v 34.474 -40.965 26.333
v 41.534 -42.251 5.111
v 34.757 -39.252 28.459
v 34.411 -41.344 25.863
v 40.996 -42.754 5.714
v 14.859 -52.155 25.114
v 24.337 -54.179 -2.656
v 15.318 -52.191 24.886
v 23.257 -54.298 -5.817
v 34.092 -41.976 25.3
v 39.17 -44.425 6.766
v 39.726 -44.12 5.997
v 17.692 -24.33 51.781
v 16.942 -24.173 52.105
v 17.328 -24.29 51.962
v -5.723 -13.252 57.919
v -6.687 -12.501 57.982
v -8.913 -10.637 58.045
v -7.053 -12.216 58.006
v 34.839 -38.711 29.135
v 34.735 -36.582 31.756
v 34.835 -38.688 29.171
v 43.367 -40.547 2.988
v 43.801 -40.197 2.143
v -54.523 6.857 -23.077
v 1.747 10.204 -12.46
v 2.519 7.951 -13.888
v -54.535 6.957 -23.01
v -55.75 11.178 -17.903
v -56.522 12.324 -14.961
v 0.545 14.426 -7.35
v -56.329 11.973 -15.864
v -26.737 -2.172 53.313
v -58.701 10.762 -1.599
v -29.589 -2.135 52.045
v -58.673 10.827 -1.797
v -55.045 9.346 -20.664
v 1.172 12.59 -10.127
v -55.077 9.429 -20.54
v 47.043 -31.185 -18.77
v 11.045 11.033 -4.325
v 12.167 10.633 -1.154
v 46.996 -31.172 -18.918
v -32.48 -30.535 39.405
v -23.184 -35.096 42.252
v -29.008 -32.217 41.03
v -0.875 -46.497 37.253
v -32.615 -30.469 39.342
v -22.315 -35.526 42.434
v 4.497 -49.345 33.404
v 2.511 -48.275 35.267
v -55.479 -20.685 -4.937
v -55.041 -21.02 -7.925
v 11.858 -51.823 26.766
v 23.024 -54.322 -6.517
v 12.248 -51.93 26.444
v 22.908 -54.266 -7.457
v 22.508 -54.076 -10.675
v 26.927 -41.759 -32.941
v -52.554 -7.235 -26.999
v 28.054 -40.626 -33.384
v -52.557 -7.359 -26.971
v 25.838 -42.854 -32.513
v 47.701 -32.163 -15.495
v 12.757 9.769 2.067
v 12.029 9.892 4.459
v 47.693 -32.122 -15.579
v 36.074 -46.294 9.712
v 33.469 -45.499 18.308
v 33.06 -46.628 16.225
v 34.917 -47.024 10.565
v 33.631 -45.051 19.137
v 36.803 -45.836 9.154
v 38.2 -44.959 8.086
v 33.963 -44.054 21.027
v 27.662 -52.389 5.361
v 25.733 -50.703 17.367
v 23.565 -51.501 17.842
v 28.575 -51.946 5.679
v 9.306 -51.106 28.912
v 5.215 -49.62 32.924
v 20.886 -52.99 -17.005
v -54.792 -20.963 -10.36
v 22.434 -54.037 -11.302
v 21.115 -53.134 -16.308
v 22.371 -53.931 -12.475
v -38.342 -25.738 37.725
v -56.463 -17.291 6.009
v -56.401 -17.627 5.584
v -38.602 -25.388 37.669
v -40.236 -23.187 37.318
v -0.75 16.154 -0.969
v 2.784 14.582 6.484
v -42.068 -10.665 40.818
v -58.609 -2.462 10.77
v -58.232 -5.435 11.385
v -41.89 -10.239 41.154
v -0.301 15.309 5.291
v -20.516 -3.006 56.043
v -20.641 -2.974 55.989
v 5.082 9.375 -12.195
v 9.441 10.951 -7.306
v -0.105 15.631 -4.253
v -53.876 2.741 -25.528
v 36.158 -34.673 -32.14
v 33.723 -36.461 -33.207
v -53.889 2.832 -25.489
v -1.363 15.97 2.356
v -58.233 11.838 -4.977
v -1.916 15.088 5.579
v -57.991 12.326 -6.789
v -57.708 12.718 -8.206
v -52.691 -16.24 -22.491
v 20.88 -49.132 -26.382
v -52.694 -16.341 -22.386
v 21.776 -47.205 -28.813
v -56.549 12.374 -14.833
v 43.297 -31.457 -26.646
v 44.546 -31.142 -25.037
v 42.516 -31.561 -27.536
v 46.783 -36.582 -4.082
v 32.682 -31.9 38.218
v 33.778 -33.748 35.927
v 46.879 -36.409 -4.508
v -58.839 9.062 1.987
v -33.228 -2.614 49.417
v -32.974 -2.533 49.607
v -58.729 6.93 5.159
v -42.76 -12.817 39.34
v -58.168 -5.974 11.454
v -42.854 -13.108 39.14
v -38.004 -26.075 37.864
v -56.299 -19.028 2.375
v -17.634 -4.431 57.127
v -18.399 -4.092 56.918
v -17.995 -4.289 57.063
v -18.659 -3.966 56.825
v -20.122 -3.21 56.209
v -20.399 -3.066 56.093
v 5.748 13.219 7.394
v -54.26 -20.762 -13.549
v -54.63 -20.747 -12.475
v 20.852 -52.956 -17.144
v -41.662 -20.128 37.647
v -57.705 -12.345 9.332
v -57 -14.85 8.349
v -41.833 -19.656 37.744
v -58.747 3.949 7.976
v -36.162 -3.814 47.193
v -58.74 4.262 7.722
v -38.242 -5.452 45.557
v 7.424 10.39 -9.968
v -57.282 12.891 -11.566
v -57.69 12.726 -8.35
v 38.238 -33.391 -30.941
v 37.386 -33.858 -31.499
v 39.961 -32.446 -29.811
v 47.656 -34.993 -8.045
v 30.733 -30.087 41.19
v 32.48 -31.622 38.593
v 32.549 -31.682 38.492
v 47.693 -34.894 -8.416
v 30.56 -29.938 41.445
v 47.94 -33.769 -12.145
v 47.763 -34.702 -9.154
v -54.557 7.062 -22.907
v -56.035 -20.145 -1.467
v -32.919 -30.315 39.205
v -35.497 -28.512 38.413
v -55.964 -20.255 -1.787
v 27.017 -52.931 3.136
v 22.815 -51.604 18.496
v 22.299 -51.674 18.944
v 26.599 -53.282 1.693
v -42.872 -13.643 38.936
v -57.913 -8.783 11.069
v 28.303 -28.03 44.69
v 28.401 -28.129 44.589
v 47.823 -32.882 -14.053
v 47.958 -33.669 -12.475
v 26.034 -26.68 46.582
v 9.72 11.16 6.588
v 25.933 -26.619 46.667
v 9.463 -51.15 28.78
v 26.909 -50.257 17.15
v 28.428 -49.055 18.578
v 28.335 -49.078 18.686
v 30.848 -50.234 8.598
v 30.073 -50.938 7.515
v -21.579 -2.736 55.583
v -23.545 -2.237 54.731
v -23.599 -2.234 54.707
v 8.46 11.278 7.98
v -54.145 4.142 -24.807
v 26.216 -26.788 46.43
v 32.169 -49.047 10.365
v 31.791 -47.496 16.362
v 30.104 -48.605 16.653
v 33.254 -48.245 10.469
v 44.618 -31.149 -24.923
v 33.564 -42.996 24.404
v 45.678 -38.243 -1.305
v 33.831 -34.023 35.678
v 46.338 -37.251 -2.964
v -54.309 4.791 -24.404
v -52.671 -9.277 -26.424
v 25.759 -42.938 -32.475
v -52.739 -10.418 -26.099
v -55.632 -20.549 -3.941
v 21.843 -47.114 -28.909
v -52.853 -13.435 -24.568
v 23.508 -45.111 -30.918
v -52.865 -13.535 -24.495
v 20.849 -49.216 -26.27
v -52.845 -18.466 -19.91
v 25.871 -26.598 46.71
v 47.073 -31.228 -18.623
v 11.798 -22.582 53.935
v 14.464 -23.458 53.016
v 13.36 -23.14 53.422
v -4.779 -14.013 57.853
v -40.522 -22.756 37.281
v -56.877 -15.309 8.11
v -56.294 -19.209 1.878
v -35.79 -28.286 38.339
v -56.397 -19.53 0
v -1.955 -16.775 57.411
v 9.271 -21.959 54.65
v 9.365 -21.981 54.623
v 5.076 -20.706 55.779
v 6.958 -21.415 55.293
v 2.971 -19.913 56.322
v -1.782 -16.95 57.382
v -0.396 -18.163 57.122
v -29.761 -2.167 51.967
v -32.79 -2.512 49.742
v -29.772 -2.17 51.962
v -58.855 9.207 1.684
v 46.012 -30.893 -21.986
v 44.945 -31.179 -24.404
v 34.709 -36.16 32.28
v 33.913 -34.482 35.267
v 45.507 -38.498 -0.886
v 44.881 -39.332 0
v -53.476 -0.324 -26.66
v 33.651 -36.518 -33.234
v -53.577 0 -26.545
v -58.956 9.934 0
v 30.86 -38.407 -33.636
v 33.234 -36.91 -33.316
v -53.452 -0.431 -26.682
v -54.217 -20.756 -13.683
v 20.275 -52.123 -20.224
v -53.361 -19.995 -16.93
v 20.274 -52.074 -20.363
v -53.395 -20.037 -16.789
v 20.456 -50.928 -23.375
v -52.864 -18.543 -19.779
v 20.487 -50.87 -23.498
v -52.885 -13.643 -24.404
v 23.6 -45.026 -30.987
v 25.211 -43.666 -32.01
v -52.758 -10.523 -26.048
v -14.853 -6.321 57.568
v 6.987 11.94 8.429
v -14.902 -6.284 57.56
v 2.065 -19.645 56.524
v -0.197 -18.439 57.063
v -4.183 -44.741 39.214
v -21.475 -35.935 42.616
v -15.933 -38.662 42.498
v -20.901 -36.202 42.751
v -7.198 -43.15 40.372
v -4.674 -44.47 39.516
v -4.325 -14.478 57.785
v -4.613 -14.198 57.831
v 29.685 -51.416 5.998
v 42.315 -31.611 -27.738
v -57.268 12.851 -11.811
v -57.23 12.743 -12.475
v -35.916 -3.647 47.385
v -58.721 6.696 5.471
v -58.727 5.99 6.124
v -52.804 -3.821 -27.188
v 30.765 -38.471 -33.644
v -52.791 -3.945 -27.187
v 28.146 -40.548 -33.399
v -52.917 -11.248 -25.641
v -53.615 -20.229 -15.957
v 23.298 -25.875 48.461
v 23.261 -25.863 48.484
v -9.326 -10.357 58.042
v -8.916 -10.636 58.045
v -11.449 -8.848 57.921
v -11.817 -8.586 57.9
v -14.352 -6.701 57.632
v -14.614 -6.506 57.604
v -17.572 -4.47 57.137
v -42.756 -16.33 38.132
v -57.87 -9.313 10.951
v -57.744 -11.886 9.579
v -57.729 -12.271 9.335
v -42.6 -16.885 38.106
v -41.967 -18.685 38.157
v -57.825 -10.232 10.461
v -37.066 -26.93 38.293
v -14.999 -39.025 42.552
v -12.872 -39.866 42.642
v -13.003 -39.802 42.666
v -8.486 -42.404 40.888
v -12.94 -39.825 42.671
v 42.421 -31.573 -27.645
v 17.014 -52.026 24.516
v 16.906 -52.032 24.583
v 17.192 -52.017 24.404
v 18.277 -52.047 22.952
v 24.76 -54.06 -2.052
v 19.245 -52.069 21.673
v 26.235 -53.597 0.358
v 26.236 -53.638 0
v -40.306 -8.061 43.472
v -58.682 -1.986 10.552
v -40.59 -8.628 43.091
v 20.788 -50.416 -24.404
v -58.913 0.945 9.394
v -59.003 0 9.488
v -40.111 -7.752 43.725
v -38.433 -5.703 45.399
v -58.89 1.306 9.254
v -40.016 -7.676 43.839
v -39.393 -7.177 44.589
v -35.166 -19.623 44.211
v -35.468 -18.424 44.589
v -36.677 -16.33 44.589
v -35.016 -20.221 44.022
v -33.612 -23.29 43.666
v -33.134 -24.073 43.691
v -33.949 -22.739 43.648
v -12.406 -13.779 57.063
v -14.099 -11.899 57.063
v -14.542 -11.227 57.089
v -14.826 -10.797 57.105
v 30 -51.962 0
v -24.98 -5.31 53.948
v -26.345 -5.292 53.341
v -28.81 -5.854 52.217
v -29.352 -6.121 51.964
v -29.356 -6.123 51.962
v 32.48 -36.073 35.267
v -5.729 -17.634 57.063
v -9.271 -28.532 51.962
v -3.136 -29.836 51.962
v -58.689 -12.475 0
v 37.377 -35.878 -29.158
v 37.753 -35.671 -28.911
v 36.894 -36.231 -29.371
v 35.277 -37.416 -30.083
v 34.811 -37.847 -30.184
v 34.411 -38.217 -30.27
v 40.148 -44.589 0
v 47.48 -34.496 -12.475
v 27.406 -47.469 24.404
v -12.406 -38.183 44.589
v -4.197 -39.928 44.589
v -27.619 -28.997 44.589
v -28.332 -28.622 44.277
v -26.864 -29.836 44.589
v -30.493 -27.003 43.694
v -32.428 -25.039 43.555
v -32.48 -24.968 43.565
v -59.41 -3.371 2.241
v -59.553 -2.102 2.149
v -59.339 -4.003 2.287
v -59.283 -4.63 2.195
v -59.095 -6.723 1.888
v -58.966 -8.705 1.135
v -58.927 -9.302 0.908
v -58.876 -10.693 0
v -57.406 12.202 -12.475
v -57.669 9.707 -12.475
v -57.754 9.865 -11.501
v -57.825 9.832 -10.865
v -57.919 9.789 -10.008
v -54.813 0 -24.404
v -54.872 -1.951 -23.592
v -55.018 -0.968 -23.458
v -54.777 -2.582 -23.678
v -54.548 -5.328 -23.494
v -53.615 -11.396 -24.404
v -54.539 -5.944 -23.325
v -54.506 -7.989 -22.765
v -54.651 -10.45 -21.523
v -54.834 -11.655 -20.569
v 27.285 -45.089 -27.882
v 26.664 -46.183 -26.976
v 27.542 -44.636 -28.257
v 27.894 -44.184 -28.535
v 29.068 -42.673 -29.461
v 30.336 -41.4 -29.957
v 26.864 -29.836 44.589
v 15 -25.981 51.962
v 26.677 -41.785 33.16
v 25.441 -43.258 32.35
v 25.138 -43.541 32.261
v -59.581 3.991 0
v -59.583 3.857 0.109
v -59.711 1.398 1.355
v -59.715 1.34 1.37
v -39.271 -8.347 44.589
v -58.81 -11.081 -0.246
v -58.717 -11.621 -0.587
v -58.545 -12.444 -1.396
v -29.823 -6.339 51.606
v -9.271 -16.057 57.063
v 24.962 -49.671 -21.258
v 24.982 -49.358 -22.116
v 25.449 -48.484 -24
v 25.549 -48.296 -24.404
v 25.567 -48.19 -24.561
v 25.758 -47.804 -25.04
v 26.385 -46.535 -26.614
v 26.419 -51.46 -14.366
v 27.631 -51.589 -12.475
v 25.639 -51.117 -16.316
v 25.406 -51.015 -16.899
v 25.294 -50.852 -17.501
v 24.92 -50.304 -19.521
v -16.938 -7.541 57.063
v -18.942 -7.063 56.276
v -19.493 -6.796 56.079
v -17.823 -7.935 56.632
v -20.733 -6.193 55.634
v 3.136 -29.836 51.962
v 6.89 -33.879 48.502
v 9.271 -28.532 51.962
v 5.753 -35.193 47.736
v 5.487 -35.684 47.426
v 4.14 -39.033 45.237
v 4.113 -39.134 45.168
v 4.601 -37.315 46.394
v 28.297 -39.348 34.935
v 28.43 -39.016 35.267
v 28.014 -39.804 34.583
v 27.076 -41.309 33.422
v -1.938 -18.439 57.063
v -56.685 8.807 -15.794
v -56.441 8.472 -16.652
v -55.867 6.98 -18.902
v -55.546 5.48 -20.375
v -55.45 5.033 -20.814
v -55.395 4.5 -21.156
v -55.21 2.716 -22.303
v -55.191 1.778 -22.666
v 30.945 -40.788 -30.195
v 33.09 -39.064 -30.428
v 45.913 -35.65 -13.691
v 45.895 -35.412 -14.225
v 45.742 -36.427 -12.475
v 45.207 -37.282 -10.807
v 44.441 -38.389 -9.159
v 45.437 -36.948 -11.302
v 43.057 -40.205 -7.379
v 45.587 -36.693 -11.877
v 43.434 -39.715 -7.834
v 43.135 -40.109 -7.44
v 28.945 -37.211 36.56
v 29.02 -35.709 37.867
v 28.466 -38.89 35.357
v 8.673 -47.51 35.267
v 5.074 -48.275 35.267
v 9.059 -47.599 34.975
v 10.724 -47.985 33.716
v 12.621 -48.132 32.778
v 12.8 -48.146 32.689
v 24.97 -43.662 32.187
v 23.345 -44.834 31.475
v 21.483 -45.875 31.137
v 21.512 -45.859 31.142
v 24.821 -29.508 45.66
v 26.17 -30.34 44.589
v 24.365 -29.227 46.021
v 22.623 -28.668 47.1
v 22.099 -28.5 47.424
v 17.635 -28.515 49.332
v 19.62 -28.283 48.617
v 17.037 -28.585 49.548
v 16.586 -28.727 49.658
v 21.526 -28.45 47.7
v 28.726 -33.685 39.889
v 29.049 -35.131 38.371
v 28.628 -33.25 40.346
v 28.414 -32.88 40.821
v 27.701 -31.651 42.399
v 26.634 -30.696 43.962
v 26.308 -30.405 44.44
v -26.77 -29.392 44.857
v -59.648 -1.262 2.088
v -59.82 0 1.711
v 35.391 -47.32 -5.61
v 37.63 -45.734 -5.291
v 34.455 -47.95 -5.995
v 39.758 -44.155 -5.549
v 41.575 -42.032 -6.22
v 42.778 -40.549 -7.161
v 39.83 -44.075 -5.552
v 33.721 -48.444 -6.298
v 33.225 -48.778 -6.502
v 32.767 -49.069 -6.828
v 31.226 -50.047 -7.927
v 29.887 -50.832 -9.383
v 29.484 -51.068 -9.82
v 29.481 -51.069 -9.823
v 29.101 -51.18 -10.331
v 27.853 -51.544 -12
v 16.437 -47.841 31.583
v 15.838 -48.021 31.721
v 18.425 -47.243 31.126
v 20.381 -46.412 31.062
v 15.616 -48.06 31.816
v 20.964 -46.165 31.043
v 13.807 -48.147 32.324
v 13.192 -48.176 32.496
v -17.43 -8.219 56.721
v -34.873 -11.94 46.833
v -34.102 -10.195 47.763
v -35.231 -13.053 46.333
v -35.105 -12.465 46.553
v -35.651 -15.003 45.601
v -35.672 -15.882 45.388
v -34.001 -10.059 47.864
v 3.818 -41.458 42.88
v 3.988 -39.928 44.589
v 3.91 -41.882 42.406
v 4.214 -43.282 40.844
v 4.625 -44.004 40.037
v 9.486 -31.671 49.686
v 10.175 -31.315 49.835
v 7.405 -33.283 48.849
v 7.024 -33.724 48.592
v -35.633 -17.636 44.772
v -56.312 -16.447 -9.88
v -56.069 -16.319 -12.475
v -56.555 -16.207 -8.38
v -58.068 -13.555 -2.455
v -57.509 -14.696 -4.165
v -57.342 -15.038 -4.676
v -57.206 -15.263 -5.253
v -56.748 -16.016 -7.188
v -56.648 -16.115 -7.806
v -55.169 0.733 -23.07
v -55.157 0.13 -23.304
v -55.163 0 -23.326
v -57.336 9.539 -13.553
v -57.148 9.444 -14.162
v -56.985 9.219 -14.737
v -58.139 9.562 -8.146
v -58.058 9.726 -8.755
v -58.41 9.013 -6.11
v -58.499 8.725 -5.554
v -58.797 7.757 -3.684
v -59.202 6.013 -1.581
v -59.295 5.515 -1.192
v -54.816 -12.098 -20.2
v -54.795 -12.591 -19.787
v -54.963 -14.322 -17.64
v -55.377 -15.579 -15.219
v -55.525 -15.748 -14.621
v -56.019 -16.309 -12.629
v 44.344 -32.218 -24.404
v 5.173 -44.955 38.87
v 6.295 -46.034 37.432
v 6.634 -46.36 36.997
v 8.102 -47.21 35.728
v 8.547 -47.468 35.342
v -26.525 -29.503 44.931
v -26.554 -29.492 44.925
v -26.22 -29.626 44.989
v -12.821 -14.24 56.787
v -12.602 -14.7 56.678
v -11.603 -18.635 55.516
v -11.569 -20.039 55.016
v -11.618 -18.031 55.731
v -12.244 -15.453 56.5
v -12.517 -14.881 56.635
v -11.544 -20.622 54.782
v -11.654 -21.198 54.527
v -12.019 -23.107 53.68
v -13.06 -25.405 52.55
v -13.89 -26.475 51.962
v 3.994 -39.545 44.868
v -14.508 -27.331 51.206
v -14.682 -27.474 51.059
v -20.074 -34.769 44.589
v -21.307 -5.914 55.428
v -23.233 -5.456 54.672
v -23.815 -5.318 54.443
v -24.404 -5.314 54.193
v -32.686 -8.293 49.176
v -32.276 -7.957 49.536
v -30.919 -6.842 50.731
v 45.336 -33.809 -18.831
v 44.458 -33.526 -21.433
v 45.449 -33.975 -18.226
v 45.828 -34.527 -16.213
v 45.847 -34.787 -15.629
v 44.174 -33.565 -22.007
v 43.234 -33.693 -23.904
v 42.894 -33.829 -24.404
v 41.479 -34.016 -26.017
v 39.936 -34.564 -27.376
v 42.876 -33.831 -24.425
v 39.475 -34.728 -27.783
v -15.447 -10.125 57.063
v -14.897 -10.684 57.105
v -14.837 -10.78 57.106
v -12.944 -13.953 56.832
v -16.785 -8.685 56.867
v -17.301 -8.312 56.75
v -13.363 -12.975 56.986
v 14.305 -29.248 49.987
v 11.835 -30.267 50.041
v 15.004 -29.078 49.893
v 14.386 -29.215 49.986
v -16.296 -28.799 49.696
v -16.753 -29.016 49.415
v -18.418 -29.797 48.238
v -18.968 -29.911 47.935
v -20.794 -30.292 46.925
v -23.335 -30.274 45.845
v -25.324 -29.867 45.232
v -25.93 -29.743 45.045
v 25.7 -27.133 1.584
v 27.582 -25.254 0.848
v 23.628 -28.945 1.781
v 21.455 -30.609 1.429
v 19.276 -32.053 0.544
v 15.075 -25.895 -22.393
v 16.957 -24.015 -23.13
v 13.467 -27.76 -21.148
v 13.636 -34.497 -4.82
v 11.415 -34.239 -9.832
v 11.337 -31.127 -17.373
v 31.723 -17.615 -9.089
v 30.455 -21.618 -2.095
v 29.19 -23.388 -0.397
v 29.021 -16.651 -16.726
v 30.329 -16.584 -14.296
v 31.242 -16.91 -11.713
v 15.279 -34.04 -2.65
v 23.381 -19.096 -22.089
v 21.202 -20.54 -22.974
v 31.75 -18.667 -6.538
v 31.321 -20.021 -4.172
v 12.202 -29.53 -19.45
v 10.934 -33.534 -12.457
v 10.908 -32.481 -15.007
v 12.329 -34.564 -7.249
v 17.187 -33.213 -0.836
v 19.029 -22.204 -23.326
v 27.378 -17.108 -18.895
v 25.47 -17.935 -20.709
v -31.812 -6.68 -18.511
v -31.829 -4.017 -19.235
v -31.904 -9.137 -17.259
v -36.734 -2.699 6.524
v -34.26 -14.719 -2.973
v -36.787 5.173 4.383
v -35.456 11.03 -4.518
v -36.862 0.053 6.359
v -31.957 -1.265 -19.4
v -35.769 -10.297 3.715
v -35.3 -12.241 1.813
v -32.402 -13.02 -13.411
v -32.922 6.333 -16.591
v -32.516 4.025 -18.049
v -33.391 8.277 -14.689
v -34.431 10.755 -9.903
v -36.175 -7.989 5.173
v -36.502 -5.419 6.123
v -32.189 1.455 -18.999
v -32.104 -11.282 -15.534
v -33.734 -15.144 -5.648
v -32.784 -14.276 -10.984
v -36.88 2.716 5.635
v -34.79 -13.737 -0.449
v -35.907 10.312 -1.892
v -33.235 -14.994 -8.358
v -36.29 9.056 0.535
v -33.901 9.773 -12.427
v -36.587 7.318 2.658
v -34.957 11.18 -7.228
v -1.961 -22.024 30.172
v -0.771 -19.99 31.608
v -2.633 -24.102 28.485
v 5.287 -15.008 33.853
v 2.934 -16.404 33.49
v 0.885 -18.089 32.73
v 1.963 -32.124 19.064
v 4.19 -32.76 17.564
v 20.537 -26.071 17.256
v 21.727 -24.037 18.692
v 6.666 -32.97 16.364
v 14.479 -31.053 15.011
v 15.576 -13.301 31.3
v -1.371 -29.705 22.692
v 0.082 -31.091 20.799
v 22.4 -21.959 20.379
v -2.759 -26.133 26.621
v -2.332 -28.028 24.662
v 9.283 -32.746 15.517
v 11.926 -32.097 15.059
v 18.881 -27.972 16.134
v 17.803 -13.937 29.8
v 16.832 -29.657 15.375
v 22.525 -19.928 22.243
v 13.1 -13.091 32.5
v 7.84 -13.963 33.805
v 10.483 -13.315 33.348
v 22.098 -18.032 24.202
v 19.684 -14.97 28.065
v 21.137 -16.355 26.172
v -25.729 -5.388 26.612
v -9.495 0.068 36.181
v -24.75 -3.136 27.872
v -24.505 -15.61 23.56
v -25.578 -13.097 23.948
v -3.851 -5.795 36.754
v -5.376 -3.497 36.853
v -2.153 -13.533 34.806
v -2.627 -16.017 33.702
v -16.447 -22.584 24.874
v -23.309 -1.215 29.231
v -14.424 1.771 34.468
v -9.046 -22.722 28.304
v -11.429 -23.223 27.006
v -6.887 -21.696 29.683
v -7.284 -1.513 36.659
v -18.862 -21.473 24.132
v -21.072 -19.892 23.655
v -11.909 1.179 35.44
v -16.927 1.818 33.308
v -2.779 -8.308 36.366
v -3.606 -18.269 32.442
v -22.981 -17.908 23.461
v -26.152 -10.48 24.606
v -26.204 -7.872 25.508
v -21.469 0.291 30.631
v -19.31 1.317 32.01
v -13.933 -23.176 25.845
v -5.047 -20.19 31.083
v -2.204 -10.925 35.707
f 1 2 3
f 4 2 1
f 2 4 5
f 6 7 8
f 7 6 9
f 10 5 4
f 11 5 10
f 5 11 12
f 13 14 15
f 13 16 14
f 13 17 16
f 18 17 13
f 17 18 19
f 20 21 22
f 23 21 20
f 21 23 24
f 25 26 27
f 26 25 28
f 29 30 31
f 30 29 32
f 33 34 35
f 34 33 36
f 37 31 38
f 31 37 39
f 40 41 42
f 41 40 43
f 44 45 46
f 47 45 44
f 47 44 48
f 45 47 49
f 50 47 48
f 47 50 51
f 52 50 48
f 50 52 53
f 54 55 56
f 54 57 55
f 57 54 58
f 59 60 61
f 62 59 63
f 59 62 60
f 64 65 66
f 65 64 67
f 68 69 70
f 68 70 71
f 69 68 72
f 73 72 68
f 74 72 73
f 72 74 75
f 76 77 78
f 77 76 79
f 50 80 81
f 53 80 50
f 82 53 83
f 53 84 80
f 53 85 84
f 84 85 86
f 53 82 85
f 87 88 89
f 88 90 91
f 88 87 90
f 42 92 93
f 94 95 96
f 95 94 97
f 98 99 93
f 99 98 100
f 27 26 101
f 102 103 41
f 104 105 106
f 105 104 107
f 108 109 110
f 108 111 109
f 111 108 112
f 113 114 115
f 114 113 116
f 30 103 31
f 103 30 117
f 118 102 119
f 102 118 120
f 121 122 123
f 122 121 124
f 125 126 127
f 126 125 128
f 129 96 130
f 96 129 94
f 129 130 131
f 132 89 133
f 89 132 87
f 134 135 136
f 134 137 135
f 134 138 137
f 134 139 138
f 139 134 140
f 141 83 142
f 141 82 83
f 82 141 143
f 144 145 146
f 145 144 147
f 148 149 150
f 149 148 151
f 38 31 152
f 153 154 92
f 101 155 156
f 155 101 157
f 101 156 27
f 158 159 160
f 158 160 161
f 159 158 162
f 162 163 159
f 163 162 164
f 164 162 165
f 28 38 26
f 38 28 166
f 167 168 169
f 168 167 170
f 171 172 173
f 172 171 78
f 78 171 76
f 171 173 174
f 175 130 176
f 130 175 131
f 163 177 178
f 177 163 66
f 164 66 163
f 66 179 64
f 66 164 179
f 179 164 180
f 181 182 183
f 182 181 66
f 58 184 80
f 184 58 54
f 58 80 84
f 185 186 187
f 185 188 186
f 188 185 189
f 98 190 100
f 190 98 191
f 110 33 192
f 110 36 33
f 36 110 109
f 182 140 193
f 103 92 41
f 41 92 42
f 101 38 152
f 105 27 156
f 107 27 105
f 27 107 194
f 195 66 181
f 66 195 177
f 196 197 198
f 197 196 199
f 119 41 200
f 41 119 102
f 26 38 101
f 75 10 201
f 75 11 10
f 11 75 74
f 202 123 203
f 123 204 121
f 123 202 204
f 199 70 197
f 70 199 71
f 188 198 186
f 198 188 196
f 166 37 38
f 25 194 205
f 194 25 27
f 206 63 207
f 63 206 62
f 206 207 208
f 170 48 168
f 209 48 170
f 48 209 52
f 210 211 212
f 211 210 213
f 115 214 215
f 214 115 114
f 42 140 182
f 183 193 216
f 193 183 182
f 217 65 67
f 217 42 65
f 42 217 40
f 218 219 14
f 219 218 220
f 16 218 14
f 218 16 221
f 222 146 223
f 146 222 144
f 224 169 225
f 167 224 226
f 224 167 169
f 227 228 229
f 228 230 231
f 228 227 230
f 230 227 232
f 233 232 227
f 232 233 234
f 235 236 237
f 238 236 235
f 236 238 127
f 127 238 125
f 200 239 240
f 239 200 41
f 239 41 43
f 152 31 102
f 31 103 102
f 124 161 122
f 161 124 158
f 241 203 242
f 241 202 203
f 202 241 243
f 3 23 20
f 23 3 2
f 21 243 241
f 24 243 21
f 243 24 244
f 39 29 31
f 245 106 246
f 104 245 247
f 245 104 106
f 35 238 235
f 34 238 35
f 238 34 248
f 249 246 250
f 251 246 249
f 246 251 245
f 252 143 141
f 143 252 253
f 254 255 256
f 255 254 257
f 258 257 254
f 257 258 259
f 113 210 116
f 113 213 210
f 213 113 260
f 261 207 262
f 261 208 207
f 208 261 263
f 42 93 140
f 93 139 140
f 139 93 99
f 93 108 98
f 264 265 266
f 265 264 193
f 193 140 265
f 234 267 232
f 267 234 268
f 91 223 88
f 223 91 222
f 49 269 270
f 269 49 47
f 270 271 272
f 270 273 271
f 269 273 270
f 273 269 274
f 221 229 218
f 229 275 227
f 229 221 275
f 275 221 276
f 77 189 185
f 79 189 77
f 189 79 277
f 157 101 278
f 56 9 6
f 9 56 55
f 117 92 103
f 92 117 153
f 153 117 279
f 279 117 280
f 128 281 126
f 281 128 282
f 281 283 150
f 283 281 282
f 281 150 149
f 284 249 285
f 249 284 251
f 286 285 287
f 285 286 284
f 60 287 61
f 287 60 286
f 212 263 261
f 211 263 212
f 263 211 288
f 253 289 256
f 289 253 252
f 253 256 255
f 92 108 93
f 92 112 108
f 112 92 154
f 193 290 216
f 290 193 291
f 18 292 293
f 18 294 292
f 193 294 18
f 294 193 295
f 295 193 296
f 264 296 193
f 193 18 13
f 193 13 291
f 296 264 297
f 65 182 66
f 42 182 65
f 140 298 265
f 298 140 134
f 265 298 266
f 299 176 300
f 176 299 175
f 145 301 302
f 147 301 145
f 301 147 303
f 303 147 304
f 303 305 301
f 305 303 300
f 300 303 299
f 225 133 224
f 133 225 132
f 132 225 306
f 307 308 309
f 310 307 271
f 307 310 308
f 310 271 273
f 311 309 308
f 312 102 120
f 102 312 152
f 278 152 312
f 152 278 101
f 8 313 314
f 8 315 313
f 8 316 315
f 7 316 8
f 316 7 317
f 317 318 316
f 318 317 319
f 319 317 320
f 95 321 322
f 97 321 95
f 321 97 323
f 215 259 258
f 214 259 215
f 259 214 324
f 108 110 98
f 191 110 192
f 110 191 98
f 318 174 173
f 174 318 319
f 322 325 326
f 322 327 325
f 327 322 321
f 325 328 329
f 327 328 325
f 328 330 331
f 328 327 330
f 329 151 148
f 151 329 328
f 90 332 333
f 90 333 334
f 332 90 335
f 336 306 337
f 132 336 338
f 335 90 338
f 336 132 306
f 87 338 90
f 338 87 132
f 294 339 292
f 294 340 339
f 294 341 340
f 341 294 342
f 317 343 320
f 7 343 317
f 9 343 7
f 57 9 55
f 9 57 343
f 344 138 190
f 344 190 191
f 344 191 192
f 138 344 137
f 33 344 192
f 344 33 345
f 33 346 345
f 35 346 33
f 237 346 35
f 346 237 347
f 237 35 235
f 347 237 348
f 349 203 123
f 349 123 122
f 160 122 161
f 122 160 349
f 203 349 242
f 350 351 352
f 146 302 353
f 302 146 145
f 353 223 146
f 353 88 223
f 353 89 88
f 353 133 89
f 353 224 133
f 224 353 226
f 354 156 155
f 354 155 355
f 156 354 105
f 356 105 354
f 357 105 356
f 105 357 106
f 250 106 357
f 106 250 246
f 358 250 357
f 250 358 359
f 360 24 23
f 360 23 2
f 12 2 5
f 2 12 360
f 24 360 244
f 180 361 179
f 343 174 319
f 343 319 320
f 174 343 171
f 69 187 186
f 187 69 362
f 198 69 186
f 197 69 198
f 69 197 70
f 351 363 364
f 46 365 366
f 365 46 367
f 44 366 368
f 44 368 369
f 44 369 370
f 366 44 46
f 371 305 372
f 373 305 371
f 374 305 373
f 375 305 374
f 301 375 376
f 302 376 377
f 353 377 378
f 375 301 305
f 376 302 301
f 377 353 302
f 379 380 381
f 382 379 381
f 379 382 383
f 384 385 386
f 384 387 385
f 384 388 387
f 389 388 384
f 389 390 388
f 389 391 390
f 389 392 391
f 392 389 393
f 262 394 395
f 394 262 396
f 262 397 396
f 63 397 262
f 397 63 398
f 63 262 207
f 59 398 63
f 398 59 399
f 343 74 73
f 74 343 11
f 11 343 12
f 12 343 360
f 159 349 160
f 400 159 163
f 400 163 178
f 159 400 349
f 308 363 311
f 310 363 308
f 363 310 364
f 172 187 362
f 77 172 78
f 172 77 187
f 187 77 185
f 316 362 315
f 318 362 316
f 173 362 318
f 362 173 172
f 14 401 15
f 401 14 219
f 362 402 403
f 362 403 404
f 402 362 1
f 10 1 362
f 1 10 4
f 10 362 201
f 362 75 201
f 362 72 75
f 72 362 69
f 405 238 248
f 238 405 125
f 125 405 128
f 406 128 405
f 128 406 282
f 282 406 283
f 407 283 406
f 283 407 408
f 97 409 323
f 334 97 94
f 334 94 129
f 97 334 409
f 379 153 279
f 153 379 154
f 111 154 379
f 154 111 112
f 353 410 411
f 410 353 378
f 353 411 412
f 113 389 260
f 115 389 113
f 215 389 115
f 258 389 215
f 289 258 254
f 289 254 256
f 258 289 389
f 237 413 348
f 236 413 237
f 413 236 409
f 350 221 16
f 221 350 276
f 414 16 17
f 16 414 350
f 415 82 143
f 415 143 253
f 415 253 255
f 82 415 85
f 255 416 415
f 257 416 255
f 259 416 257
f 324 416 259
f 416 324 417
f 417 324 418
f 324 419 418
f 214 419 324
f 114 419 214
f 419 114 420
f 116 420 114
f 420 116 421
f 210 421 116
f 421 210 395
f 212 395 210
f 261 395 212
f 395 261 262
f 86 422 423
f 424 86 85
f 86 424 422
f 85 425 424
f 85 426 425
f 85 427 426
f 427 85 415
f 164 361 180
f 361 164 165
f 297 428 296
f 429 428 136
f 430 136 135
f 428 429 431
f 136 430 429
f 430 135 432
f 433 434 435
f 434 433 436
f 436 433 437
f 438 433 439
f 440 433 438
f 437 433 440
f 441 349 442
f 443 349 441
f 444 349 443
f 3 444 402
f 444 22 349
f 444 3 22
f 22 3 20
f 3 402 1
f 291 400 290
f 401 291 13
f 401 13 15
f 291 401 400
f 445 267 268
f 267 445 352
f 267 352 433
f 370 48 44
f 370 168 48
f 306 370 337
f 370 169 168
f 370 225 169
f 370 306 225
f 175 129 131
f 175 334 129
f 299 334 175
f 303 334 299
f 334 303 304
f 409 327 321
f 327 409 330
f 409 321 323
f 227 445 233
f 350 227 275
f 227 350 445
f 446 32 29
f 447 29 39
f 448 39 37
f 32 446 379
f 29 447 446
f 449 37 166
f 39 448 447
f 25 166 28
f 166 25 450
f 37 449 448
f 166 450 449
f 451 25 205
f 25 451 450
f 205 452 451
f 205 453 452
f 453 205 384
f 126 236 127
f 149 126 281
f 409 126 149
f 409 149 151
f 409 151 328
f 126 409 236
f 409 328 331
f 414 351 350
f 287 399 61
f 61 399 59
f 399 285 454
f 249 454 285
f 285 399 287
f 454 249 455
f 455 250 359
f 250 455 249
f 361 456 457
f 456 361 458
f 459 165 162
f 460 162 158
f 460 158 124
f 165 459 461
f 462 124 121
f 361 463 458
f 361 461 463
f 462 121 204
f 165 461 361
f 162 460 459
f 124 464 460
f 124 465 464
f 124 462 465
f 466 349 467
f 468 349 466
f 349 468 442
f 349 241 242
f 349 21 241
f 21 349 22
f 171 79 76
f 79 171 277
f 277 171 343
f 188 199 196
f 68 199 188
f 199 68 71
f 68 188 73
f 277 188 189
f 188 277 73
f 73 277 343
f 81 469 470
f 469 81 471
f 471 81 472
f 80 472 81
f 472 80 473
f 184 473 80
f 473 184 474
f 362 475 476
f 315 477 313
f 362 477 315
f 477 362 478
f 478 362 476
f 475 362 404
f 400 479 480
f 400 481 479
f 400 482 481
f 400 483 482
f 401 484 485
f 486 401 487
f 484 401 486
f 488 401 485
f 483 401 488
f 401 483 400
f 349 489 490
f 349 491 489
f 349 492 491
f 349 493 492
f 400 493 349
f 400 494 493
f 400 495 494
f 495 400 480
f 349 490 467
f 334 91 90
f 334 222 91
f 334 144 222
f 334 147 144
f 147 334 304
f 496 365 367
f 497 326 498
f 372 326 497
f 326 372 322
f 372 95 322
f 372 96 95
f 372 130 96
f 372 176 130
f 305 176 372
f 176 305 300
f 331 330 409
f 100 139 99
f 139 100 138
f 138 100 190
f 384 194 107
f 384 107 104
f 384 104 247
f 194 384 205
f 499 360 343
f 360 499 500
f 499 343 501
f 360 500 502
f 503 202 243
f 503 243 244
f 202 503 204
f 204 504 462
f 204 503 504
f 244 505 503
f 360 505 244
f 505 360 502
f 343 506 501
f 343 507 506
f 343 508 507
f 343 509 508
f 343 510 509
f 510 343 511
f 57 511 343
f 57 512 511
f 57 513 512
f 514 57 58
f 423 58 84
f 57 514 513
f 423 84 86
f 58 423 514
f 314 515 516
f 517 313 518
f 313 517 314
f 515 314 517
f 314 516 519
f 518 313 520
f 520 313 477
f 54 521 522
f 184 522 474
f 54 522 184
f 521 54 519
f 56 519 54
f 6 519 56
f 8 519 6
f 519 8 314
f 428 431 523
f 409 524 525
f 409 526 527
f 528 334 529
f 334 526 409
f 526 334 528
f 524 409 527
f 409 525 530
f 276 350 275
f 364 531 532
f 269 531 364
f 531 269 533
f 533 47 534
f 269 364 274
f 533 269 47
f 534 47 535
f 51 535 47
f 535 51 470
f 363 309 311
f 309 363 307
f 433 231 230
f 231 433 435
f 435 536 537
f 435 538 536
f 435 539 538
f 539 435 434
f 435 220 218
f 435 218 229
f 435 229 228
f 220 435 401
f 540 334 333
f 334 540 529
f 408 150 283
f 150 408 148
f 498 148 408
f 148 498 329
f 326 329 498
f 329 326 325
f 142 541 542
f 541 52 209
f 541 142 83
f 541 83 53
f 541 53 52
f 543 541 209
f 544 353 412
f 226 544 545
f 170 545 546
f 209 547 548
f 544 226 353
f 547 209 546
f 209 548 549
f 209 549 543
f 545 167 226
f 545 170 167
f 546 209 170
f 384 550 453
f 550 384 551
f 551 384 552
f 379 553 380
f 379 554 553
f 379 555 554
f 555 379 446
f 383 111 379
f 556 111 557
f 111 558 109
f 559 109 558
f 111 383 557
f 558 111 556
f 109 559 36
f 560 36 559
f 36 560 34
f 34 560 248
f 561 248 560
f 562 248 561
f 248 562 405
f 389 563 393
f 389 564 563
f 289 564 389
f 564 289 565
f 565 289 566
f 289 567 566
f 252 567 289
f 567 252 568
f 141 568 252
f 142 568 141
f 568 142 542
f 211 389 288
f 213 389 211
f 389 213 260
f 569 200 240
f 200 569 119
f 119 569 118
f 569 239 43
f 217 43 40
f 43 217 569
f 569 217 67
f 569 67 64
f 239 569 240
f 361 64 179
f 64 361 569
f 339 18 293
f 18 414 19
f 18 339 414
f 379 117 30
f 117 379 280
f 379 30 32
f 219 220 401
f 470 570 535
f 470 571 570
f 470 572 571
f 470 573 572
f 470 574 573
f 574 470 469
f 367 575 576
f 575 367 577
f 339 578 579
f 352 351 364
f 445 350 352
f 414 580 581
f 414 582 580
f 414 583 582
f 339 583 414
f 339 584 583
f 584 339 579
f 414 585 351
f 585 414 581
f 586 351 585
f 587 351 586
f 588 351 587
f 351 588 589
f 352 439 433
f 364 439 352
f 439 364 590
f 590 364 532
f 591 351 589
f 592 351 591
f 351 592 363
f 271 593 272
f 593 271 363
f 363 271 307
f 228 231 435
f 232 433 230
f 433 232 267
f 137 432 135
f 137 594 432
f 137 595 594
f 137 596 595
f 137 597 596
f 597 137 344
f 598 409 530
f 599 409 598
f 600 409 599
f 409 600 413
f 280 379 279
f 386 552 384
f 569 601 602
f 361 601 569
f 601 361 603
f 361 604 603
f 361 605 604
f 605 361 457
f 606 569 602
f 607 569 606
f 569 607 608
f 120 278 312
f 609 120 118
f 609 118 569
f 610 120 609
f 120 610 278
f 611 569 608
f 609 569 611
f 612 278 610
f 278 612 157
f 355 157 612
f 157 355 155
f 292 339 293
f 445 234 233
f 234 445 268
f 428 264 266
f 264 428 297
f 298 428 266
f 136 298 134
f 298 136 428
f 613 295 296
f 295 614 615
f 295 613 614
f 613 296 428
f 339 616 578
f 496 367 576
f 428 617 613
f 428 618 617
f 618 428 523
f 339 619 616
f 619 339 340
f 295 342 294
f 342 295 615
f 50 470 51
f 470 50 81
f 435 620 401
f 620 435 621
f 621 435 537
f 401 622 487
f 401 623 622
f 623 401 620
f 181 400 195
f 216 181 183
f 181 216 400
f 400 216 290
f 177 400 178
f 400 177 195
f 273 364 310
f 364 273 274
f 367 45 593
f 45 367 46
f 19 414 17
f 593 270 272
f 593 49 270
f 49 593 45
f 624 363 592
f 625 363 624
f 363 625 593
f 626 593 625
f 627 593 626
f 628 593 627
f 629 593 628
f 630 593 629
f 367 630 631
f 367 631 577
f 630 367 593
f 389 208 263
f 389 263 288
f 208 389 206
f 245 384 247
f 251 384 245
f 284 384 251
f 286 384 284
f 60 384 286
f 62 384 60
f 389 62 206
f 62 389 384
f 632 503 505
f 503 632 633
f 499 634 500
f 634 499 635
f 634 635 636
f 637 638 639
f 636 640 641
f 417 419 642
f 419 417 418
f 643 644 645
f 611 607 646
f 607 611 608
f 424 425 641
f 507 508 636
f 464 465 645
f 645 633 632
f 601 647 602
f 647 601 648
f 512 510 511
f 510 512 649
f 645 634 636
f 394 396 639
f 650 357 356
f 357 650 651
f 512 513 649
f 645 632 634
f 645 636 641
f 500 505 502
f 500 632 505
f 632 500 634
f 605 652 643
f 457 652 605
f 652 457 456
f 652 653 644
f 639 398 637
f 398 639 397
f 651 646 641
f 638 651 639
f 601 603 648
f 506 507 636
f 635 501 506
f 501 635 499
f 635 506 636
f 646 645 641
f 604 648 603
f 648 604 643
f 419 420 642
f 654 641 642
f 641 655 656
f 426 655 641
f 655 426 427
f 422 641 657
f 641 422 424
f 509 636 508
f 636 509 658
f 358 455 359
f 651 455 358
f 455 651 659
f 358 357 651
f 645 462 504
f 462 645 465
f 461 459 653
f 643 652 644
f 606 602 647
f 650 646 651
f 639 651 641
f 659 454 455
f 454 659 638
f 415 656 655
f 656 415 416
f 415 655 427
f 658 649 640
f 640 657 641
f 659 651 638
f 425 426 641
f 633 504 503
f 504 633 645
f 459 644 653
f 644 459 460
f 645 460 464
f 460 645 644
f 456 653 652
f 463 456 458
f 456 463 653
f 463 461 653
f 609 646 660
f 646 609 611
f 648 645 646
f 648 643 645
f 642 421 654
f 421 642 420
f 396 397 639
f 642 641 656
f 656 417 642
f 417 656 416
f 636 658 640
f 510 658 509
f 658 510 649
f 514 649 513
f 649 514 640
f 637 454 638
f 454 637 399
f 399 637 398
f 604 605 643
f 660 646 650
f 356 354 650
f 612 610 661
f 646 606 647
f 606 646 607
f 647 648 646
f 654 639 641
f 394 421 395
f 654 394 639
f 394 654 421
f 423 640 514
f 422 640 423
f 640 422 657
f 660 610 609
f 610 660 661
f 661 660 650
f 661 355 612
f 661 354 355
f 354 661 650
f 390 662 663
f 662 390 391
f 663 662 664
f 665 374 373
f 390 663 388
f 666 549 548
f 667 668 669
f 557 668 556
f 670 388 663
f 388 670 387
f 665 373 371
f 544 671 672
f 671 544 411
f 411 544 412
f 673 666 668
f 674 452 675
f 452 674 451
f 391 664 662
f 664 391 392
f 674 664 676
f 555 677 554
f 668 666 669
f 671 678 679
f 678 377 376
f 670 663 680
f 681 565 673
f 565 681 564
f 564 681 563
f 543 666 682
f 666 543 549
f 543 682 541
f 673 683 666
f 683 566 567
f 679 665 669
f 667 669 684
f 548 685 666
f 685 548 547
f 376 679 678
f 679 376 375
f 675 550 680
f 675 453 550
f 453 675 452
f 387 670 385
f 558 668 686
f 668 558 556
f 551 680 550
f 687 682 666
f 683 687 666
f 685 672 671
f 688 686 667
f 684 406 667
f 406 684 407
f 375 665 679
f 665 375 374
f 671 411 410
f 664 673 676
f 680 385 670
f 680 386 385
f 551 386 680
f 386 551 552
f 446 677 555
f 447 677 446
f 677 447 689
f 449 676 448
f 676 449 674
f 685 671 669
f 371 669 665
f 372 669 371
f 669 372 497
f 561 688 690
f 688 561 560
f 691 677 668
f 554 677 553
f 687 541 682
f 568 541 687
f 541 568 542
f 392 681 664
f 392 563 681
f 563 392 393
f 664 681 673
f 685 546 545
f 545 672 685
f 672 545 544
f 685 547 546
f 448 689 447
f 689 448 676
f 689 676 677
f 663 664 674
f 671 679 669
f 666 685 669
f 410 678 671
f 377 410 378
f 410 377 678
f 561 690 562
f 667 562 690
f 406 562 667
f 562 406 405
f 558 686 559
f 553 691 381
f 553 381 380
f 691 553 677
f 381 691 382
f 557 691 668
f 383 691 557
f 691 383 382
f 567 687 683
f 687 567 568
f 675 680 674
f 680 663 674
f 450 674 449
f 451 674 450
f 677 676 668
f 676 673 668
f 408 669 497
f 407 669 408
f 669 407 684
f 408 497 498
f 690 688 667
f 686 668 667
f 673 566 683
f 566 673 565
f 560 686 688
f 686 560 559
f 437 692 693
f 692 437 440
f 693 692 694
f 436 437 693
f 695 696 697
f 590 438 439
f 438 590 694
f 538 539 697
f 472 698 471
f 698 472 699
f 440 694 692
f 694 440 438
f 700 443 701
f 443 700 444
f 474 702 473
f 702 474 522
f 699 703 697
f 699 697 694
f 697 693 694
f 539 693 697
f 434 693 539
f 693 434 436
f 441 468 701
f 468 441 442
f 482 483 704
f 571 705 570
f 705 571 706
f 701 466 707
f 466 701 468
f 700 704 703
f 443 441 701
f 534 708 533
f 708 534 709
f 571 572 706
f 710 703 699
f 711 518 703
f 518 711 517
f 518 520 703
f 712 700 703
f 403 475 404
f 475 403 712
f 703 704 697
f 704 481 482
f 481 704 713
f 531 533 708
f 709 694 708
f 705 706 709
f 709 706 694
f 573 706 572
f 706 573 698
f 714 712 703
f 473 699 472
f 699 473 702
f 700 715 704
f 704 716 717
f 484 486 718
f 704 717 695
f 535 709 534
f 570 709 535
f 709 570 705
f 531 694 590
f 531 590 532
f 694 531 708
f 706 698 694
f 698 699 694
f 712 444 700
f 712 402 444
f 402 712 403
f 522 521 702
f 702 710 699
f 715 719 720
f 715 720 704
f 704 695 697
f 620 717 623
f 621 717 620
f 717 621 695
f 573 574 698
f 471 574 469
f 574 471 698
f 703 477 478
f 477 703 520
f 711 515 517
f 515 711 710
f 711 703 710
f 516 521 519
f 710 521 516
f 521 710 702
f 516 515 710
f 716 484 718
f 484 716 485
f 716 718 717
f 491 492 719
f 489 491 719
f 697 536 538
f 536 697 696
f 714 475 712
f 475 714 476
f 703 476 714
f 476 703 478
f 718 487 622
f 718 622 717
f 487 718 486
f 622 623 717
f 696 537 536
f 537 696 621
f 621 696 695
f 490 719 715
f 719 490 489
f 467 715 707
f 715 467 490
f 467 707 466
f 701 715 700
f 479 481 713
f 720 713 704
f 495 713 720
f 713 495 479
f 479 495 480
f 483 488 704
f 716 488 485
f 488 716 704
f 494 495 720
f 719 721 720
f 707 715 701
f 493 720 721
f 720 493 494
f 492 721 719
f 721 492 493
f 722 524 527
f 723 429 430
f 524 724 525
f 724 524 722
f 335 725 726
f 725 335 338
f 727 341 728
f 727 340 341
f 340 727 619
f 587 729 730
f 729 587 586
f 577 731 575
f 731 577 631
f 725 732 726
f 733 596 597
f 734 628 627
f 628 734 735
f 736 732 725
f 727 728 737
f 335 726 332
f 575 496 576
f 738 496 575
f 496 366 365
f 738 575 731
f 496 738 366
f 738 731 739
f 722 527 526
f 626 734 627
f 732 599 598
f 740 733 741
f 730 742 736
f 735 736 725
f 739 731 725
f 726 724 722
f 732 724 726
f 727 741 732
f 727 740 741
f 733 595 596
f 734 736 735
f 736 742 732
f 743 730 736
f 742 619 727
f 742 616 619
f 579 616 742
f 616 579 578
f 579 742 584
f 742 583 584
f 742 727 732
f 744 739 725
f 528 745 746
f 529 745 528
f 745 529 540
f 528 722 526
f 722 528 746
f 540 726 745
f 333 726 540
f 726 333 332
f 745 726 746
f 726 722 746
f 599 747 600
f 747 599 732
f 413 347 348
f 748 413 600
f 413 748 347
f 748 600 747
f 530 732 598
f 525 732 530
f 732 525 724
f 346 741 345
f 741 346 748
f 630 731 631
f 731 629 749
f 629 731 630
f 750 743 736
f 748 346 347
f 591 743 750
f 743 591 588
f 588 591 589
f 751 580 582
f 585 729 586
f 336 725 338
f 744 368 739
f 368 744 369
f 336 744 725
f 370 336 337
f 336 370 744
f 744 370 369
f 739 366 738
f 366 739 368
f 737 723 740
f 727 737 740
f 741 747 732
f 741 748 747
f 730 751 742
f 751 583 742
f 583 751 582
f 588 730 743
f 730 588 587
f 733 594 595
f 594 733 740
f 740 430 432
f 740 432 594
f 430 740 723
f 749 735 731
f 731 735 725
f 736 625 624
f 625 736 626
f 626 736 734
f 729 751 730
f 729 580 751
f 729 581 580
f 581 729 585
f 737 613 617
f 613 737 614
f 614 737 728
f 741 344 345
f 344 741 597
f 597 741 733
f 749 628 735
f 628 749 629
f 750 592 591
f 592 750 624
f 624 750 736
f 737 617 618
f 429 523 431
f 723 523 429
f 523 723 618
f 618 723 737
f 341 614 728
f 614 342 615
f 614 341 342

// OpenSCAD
difference() {
	intersection() {
		hull() {
			rotate(a = -150.2044300830, v = [0.4781958647, -0.1350745970, 0.0000000000]) {
				rotate(a = -90.0000000000, v = [0.3826834324, -0.9238795325, 0.0000000000]) {
					cylinder(h = 60, r = 16.2000000000);
				}
			}
			rotate(a = -150.2044300830, v = [0.4781958647, -0.1350745970, 0.0000000000]) {
				rotate(a = -90.0000000000, v = [0.6087614290, 0.7933533403, -0.0000000000]) {
					cylinder(h = 60, r = 16.2000000000);
				}
			}
			rotate(a = -150.2044300830, v = [0.4781958647, -0.1350745970, 0.0000000000]) {
				rotate(a = -151.9205722594, v = [0.0084280234, -0.4706196600, 0.0000000000]) {
					cylinder(h = 60, r = 16.2000000000);
				}
			}
			rotate(a = -150.2044300830, v = [0.4781958647, -0.1350745970, 0.0000000000]) {
				rotate(a = -161.5616070448, v = [0.0090619990, 0.3161549461, -0.0000000000]) {
					cylinder(h = 60, r = 16.2000000000);
				}
			}
		}
		sphere(r = 60);
	}
	union() {
		rotate(a = -150.2044300830, v = [0.4781958647, -0.1350745970, 0.0000000000]) {
			rotate(a = -90.0000000000, v = [0.3826834324, -0.9238795325, 0.0000000000]) {
				translate(v = [0, 0, 35]) {
					cylinder(h = 100, r = 13.2000000000);
				}
			}
		}
		rotate(a = -150.2044300830, v = [0.4781958647, -0.1350745970, 0.0000000000]) {
			rotate(a = -90.0000000000, v = [0.6087614290, 0.7933533403, -0.0000000000]) {
				translate(v = [0, 0, 35]) {
					cylinder(h = 100, r = 13.2000000000);
				}
			}
		}
		rotate(a = -150.2044300830, v = [0.4781958647, -0.1350745970, 0.0000000000]) {
			rotate(a = -151.9205722594, v = [0.0084280234, -0.4706196600, 0.0000000000]) {
				translate(v = [0, 0, 35]) {
					cylinder(h = 100, r = 13.2000000000);
				}
			}
		}
		rotate(a = -150.2044300830, v = [0.4781958647, -0.1350745970, 0.0000000000]) {
			rotate(a = -161.5616070448, v = [0.0090619990, 0.3161549461, -0.0000000000]) {
				translate(v = [0, 0, 35]) {
					cylinder(h = 100, r = 13.2000000000);
				}
			}
		}
	}
}
